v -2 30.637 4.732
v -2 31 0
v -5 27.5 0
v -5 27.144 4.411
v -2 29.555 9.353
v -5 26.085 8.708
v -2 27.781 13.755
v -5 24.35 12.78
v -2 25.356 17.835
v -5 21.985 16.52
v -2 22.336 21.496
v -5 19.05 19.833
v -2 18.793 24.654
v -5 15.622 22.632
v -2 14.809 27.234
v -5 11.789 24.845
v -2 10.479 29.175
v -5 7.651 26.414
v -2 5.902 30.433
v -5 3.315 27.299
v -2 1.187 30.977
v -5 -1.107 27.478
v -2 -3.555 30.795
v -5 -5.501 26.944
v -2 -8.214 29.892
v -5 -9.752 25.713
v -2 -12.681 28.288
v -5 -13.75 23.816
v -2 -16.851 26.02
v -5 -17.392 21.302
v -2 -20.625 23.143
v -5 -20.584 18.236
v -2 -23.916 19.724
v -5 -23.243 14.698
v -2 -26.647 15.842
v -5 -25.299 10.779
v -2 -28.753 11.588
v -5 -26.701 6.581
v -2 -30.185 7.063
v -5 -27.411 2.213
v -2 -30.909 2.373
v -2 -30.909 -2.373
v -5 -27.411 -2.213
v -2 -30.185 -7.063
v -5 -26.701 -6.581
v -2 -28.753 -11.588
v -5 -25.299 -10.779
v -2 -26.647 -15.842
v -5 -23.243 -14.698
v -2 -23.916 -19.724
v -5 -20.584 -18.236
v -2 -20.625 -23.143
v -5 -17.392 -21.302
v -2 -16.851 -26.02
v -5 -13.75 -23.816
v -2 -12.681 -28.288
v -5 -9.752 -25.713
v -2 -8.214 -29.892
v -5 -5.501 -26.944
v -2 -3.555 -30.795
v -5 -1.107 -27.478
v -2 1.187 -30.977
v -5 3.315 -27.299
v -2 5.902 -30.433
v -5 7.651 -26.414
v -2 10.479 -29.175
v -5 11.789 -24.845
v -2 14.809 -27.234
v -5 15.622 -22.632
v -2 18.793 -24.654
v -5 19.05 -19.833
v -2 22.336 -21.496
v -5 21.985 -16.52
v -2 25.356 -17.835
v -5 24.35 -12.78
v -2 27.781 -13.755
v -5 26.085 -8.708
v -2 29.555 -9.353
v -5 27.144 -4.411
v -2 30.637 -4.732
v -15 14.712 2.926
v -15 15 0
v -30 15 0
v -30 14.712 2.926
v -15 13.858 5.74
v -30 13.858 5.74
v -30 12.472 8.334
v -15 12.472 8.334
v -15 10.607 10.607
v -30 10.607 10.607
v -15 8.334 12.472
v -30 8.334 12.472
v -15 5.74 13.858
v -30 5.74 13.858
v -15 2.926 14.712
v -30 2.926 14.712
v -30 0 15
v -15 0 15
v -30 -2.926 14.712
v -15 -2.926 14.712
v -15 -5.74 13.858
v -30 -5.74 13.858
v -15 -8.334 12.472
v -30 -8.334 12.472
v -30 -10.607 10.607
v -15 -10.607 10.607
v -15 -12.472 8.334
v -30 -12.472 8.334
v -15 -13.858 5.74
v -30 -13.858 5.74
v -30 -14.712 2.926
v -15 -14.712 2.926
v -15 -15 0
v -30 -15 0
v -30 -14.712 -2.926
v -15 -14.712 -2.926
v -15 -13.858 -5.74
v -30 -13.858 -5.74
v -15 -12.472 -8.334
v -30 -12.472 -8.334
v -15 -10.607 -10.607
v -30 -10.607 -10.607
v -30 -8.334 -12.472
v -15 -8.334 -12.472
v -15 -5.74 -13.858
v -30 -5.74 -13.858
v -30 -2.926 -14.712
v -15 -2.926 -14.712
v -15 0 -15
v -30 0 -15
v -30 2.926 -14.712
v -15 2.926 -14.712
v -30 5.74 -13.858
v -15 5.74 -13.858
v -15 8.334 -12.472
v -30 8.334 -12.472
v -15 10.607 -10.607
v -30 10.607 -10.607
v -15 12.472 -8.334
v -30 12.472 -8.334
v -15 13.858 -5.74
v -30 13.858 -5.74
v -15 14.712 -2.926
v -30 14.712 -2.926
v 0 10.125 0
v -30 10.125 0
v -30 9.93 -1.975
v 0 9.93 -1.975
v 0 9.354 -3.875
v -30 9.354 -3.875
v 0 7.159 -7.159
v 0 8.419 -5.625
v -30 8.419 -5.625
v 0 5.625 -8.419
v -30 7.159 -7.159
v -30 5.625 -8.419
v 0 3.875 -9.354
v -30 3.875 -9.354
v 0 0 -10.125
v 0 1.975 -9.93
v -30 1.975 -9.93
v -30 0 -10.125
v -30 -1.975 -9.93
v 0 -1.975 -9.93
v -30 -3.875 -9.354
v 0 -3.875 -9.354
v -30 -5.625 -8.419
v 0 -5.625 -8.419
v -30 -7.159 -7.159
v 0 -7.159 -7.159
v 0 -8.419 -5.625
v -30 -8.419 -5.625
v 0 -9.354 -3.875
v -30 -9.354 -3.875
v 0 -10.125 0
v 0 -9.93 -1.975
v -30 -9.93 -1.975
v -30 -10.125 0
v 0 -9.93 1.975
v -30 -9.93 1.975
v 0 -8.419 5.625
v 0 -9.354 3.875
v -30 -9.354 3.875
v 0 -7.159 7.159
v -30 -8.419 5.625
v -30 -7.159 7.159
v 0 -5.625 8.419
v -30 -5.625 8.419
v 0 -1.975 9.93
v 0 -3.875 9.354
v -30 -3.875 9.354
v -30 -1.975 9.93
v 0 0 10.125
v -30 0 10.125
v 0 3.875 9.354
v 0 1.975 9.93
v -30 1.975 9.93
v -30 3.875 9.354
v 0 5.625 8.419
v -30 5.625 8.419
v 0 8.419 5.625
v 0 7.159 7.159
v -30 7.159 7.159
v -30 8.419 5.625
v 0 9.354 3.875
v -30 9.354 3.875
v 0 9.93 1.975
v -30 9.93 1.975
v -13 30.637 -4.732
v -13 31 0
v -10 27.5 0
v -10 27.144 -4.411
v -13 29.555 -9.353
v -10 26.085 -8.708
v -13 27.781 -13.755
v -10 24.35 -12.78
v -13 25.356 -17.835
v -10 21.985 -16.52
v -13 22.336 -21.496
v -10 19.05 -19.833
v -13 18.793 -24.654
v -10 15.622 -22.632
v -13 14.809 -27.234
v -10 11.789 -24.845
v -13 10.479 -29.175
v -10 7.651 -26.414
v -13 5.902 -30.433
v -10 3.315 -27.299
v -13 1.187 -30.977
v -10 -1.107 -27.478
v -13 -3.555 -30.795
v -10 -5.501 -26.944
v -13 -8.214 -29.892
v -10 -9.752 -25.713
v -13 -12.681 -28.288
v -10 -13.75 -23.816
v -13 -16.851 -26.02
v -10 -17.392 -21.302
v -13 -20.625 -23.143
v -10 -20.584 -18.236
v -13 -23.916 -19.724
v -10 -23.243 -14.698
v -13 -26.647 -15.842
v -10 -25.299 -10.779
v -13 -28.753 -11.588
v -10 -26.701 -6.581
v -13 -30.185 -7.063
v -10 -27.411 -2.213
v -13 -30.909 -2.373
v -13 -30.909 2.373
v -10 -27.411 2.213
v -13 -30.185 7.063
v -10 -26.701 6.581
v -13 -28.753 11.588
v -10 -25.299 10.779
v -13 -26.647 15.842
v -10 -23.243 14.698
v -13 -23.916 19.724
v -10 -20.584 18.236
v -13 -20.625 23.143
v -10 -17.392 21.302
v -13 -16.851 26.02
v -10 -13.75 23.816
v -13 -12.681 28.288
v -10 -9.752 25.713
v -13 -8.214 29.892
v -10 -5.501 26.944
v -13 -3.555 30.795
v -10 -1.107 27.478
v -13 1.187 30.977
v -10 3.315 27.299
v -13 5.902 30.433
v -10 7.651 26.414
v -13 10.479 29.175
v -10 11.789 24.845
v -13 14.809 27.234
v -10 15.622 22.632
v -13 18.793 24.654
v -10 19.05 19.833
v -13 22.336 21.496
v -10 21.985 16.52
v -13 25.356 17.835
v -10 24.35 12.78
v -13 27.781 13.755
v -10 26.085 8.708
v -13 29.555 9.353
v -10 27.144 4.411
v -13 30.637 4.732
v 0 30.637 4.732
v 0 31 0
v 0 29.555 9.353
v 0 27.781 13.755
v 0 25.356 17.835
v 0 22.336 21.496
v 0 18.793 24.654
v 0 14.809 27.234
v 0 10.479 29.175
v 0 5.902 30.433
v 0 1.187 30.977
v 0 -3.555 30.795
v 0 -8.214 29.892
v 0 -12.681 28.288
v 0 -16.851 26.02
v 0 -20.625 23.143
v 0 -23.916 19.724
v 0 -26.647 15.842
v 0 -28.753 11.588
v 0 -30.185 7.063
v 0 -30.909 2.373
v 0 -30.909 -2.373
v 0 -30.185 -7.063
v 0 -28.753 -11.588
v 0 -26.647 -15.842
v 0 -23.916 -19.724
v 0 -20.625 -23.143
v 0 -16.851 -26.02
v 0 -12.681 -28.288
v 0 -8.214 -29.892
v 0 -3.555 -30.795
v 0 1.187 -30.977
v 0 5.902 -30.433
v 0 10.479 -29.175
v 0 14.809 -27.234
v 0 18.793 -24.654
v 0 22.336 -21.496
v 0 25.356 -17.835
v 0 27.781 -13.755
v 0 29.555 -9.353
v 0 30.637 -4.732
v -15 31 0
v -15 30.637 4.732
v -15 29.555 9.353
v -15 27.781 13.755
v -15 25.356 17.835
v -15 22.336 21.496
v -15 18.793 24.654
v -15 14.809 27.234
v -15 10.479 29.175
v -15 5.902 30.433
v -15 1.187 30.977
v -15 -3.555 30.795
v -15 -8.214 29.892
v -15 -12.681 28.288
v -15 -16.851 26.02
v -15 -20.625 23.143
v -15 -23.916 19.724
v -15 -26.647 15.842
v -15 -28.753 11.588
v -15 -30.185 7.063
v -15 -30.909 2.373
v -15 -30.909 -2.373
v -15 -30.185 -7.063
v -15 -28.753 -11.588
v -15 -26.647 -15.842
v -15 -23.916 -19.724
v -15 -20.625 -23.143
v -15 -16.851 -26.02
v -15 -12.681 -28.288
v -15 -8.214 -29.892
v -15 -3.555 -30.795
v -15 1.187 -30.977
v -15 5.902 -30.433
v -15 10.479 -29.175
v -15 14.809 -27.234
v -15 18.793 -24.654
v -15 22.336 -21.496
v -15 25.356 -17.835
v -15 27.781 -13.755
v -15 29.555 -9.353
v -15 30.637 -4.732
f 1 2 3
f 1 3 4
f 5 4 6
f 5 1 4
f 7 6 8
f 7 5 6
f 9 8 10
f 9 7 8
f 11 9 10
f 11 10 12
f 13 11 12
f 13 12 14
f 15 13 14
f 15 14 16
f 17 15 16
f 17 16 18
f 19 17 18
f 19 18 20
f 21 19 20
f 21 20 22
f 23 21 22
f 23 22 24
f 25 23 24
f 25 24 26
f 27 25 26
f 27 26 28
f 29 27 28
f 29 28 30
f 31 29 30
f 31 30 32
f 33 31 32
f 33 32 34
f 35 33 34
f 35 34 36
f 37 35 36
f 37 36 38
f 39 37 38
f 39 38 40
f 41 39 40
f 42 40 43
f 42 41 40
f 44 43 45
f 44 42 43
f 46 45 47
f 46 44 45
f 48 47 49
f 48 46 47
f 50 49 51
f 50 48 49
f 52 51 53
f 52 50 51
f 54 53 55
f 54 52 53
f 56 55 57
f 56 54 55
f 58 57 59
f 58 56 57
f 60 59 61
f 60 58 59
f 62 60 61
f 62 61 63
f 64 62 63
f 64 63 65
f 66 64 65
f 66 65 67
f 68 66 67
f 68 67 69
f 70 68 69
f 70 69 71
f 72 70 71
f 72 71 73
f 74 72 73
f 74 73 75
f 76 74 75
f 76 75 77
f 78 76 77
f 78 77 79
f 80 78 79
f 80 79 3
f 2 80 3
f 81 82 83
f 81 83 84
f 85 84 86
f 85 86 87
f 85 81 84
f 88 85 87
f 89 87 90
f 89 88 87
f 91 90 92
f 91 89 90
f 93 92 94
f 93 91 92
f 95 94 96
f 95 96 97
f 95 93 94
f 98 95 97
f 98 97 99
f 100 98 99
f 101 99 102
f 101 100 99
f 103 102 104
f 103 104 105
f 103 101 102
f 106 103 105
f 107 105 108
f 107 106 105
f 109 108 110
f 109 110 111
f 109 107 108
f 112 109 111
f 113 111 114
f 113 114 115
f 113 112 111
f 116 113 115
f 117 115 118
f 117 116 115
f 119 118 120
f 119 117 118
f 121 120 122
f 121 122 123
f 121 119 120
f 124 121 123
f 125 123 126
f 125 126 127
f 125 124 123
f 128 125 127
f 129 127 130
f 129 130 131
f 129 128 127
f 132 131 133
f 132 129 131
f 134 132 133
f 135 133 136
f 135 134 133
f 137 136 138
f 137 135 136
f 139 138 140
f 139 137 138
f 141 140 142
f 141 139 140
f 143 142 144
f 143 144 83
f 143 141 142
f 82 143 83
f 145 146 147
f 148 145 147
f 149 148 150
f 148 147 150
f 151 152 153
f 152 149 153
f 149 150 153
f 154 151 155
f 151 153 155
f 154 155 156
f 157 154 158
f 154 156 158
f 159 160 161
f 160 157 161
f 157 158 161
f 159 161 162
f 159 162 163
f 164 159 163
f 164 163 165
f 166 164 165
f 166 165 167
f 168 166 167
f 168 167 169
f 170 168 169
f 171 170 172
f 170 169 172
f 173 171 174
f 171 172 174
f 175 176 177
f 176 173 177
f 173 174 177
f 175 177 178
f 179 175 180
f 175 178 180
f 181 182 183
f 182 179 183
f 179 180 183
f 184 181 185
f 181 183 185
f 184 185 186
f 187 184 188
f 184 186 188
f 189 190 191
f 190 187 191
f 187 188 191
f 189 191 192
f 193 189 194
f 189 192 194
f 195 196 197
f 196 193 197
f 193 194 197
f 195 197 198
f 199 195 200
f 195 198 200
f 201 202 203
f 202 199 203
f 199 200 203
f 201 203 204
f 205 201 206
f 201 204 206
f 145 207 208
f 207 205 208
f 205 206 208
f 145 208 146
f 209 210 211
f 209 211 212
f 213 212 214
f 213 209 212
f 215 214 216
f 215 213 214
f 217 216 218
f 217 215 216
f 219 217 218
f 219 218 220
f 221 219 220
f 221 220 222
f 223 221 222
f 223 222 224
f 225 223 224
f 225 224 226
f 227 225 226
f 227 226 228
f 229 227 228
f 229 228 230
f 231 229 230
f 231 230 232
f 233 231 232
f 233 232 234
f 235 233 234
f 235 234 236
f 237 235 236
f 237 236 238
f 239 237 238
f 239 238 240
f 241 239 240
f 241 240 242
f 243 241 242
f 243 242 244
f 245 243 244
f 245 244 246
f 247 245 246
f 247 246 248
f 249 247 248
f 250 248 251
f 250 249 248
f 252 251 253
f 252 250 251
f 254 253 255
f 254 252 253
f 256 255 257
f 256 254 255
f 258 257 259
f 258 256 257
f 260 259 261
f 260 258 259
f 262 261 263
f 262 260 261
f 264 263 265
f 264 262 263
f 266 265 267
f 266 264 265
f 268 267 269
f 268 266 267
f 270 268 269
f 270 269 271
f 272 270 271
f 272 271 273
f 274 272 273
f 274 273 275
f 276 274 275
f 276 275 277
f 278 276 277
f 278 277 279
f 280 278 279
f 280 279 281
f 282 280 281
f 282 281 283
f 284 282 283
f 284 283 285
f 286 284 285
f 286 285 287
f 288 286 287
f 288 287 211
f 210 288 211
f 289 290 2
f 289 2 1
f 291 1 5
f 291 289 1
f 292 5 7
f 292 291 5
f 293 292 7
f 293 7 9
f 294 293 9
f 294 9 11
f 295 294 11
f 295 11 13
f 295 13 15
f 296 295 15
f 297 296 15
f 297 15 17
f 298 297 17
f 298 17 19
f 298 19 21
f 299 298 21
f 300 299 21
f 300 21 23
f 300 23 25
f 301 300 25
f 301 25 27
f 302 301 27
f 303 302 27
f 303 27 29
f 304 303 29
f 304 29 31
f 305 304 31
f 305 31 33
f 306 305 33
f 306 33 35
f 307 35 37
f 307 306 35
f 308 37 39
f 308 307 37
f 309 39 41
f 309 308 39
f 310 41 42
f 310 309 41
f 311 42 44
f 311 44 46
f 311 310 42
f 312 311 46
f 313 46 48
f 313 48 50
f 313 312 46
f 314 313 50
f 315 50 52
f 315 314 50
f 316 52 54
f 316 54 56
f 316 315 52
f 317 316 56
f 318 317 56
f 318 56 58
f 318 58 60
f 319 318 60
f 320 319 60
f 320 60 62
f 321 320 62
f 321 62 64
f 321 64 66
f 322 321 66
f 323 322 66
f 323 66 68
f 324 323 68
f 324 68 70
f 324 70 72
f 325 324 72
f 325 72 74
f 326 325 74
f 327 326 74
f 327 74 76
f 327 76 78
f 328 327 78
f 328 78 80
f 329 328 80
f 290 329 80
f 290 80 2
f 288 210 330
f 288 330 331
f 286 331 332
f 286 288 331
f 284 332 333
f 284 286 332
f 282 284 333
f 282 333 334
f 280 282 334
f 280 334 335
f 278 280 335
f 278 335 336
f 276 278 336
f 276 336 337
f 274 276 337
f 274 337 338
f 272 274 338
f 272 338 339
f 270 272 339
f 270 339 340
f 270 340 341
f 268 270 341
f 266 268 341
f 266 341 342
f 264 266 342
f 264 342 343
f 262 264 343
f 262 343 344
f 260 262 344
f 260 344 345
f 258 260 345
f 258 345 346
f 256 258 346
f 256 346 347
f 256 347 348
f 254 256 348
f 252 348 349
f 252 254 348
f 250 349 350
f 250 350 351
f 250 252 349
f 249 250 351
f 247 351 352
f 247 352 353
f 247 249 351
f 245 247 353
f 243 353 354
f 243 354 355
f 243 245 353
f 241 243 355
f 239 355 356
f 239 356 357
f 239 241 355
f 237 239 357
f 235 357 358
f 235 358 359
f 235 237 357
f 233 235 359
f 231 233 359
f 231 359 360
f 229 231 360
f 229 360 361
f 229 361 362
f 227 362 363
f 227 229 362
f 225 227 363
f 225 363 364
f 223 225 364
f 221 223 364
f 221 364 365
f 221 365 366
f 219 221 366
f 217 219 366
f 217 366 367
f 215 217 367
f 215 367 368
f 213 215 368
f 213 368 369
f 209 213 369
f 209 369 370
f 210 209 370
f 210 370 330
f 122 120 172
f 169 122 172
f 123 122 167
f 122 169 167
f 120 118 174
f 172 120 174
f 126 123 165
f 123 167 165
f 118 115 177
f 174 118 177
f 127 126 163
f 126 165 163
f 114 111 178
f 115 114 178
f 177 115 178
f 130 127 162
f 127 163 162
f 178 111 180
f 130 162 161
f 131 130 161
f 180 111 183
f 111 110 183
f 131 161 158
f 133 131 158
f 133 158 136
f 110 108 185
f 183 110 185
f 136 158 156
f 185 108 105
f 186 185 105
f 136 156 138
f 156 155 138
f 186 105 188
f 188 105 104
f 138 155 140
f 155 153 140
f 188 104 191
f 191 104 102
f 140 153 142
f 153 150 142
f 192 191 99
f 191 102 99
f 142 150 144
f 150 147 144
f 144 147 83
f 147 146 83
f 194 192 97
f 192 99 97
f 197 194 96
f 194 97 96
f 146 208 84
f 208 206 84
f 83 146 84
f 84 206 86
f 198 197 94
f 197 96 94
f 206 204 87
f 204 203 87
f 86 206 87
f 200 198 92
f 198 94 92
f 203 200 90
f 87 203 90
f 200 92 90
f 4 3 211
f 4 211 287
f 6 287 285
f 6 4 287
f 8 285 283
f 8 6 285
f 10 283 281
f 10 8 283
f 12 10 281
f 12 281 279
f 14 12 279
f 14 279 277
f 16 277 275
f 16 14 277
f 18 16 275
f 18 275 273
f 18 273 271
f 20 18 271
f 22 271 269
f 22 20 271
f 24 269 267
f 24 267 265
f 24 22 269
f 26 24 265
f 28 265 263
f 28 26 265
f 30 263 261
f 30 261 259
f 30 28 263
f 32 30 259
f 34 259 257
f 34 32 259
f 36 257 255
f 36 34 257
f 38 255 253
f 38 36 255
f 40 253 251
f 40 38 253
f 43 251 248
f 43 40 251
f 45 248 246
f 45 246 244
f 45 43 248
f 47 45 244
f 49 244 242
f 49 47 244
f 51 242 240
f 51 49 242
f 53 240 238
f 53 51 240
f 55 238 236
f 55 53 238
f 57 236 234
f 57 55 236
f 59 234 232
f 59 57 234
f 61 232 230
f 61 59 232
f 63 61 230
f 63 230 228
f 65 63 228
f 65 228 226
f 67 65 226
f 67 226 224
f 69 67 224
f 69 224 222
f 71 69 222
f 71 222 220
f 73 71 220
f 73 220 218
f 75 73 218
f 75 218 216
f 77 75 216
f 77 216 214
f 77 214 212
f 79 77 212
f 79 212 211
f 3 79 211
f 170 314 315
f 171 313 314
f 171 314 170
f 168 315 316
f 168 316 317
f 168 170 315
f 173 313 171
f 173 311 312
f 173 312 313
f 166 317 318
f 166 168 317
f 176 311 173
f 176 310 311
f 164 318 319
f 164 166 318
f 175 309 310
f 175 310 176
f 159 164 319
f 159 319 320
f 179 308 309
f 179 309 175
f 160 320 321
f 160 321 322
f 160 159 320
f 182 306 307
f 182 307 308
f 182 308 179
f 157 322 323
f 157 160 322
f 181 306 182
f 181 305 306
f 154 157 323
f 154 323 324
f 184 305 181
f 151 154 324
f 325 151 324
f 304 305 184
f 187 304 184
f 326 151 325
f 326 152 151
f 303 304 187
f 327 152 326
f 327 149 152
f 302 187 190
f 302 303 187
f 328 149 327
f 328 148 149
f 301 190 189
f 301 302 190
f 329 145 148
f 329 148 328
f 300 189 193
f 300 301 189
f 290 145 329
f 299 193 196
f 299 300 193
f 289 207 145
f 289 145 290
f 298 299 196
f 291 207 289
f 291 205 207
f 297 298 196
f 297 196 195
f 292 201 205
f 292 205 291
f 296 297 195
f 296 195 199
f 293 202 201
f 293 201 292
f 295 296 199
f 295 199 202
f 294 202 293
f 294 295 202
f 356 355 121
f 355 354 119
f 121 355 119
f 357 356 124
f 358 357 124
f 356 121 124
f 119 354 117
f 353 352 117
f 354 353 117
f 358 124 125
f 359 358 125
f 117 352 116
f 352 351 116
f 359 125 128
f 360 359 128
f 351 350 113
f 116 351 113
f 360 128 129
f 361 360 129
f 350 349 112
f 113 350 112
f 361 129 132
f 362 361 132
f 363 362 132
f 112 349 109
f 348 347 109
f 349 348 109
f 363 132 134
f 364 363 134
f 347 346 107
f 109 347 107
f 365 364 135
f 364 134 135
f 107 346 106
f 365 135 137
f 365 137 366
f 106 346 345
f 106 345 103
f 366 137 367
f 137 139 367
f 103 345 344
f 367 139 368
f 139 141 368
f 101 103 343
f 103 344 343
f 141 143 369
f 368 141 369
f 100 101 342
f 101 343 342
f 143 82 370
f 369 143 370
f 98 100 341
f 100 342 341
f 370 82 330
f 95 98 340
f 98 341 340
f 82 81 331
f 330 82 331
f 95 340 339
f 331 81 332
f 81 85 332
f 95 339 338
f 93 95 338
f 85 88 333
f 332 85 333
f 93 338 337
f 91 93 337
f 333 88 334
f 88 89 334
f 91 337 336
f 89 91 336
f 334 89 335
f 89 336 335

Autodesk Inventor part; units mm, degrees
ref_plane "YZ Plane" through (0, 0, 0) normal (1, 0, 0) x (0, 1, 0)
ref_plane "XZ Plane" through (0, 0, 0) normal (0, 1, 0) x (-1, 0, 0)
ref_plane "XY Plane" through (0, 0, 0) normal (0, 0, 1) x (1, 0, 0)
sketch "Boceto1" plane through (0, 0, 0) normal (0, 0, 1) x (1, 0, 0)
  line L0 (-24.1261, 0) -> (26.0802, 0) construction
  line L1 (0, 10.125) -> (-30, 10.125)
  line L2 (-30, 10.125) -> (-30, 15)
  line L3 (-30, 15) -> (-15, 15)
  line L4 (-15, 15) -> (-15, 31)
  line L5 (0, 31) -> (0, 10.125)
  line L6 (-15, 31) -> (-13, 31)
  line L7 (-13, 31) -> (-10, 27.5)
  line L8 (-10, 27.5) -> (-5, 27.5)
  line L9 (-2, 31) -> (0, 31)
  line L10 (-2, 31) -> (-5, 27.5)
  line L11 (-7.5, 27.5) -> (-7.5, 0) construction
  point P0 (0, 0)
  point P1 (0, 20.5625)
  dimension "d0" = 27.5
  dimension "d1" = 31
  dimension "d2" = 10.125
  dimension "d3" = 15
  dimension "d4" = 15
  dimension "d5" = 2
  dimension "d6" = 2
  dimension "d7" = 5
  dimension "d8" = 7.5
  dimension "d9" = 15
revolve "Revolución1" add sketch "Boceto1" angle 360 about axis through (-24.1261, 0, 0) along (1, 0, 0)
properties part number "PoleaBrazos"
